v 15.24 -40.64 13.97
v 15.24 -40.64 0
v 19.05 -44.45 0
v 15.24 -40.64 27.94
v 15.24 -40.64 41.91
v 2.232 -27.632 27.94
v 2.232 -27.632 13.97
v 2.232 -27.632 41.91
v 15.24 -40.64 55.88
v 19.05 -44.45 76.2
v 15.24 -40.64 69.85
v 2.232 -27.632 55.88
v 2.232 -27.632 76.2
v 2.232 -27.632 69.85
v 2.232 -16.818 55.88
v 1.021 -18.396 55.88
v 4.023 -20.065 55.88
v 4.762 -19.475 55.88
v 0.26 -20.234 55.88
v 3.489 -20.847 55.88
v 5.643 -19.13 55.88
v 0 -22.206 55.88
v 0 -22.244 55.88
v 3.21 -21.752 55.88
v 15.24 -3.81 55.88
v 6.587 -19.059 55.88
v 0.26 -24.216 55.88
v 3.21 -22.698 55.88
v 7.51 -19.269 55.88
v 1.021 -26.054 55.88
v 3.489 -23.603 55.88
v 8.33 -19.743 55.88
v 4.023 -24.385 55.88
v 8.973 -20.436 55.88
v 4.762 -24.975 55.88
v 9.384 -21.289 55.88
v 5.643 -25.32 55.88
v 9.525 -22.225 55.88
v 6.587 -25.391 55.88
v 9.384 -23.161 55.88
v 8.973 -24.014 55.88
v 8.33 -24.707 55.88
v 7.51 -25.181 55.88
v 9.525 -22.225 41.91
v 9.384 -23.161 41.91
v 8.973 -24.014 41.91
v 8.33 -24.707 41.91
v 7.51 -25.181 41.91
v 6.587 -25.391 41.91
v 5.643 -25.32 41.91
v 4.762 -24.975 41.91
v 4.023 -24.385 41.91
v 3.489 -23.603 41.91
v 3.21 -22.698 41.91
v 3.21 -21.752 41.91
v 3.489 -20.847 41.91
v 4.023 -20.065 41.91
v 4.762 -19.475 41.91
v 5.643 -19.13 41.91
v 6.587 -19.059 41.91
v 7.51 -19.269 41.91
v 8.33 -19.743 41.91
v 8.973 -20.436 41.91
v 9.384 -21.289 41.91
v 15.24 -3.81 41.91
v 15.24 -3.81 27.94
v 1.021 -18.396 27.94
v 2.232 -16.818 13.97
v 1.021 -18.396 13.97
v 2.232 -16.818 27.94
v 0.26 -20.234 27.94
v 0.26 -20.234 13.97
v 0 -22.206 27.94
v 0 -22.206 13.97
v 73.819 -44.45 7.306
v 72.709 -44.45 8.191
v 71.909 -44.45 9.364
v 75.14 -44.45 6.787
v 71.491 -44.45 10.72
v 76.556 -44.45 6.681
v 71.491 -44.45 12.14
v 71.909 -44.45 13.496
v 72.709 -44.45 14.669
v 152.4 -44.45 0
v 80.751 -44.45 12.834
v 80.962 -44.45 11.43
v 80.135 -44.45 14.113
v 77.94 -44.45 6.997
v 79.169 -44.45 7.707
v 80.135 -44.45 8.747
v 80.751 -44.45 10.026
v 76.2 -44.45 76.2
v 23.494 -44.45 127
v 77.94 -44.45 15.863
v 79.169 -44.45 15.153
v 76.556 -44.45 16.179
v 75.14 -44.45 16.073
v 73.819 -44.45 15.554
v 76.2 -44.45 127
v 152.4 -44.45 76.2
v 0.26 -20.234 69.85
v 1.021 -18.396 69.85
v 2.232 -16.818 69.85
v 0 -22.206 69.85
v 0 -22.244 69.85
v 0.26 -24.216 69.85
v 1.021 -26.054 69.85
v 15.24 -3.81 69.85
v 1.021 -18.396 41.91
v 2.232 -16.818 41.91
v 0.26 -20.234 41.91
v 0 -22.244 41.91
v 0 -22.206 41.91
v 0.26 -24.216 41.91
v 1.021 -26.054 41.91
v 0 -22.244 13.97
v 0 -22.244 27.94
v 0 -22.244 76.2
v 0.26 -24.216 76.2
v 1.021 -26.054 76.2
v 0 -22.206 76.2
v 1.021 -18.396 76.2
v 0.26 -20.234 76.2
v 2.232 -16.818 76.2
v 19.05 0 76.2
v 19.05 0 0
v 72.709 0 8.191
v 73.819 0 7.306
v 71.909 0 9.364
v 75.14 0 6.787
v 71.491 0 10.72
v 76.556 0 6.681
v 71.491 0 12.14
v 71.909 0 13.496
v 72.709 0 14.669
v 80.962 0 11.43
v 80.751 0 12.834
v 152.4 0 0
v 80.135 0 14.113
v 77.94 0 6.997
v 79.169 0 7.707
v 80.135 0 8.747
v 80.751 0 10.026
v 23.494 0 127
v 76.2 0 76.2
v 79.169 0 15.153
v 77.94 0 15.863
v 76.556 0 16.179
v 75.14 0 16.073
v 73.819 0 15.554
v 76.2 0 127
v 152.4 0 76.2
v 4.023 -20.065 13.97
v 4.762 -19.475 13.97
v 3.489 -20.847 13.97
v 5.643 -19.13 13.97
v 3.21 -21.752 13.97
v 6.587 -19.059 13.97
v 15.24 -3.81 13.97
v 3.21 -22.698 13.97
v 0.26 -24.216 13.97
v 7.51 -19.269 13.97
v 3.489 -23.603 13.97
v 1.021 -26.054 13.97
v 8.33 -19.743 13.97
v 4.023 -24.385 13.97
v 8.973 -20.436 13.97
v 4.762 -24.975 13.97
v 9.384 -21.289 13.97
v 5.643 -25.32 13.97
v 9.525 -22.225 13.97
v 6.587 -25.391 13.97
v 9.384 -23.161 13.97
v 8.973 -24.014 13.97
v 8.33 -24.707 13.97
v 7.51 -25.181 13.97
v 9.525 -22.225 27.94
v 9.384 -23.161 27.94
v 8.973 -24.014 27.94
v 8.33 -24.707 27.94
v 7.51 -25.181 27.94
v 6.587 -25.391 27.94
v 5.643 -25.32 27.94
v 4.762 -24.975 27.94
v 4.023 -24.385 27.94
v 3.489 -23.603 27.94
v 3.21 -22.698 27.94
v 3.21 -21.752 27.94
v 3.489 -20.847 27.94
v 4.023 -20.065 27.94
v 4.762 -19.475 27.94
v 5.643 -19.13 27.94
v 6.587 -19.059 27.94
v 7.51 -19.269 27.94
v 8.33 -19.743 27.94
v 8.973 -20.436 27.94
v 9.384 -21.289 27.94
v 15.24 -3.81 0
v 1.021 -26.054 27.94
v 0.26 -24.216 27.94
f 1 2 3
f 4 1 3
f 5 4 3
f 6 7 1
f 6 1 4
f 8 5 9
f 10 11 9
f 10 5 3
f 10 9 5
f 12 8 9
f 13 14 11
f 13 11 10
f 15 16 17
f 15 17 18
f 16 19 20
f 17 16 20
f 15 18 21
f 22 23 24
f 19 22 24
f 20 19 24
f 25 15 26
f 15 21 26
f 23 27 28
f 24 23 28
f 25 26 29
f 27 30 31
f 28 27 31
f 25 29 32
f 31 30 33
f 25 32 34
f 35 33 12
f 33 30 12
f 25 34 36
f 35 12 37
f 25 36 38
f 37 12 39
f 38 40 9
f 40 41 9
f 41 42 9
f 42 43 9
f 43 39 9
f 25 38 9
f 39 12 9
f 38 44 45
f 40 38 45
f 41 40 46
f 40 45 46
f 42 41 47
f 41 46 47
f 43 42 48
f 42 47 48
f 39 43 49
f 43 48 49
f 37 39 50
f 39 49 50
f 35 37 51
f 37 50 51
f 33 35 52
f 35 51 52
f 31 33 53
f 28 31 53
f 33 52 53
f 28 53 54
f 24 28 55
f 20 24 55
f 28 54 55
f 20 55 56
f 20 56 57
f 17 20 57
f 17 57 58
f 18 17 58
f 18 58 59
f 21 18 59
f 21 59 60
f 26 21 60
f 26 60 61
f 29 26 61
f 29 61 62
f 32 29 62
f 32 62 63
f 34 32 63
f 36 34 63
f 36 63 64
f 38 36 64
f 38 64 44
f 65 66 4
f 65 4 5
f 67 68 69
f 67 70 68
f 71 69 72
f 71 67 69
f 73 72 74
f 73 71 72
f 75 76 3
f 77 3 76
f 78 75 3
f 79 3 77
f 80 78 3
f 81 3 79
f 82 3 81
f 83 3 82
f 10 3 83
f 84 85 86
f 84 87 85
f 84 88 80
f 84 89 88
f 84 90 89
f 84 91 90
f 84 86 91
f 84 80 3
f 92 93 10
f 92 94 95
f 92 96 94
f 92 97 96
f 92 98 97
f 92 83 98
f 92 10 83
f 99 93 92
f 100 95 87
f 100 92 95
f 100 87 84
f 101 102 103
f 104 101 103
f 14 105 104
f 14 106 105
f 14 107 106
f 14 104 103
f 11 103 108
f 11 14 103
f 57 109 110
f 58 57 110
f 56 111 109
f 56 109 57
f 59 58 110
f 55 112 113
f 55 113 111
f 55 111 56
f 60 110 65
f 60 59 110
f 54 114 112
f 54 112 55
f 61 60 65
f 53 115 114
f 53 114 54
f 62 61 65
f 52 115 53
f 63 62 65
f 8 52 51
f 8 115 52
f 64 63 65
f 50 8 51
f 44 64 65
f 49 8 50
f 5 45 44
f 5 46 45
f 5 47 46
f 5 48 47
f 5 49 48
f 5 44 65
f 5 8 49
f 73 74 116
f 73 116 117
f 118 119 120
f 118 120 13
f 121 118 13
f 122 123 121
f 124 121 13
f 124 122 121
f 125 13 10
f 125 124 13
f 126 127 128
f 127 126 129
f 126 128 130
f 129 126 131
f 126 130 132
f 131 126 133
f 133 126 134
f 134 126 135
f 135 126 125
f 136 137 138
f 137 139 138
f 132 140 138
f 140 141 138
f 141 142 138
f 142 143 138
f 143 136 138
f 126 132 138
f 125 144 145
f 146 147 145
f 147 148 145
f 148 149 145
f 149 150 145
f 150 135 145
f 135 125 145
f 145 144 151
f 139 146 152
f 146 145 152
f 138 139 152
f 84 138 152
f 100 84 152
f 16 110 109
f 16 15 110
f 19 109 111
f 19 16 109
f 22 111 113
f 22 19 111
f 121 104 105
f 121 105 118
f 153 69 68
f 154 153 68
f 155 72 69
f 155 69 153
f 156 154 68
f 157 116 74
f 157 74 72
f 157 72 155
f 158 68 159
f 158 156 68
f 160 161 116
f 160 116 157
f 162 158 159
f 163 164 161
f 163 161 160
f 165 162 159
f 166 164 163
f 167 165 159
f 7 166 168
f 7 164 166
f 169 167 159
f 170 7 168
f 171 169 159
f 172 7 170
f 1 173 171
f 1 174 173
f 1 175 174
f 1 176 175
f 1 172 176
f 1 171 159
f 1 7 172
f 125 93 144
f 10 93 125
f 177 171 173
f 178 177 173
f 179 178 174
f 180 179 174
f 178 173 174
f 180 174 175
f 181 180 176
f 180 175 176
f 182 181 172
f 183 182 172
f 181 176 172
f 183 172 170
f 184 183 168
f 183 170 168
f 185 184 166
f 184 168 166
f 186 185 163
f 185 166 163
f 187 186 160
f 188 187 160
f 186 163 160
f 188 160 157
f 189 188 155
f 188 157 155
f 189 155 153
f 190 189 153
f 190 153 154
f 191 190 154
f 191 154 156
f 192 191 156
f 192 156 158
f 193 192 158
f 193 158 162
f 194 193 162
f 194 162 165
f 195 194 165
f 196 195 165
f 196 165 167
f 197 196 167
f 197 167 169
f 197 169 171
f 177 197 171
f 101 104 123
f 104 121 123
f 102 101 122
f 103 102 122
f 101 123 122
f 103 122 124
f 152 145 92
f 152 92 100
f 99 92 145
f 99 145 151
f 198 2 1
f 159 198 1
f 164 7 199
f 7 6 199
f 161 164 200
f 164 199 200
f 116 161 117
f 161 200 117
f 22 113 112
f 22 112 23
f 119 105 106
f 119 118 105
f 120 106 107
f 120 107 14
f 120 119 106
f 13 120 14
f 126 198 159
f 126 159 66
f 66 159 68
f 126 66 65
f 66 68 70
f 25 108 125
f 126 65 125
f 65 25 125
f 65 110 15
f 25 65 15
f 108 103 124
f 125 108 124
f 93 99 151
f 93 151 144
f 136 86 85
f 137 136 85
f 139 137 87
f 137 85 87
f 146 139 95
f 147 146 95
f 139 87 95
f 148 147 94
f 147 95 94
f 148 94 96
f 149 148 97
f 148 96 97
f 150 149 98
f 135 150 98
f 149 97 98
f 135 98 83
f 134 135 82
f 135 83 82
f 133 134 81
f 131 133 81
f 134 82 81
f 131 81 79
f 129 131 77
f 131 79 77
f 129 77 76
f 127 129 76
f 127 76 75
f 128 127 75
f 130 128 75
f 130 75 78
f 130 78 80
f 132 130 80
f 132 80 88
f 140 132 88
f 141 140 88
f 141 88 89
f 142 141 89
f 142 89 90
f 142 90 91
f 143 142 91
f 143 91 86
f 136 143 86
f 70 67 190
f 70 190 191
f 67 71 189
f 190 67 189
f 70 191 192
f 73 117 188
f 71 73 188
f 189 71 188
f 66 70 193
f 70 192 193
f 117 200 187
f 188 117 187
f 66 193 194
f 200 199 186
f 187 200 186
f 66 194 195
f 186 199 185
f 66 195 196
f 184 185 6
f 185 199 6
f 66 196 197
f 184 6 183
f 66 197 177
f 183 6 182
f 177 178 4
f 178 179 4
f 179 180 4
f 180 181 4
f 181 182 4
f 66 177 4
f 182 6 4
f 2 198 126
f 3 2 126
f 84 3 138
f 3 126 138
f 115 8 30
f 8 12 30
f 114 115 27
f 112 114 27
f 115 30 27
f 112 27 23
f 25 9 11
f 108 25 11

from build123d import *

# Parameters (mm, degrees)
F0_W       = 152.4
F0_H       = 76.2
F1_DEPTH   = 44.45
F2_W       = 15.24
F2_H       = 13.97
F3_DEPTH   = 44.451
F4_R       = 3.175
F5_DEPTH   = 69.85
F6_C1_SIZE = 19.05
F6_C2_SIZE = 19.05
F7_R       = 4.7625
F8_DEPTH   = 44.451
F10_DEPTH  = 44.45
F11_R      = 7.62


with BuildPart() as f1:
    # F0 (on Front) → F1 (new body)
    with BuildSketch(Plane.XZ):
        with Locations((76.2, 38.1)):
            Rectangle(F0_W, F0_H)
    extrude(amount=F1_DEPTH)

    # F2 (on face) → F3 (cut, through all)
    with BuildSketch(Plane.XZ.offset(44.45)):
        with Locations((7.62, 6.985)):
            Rectangle(F2_W, F2_H)
        with Locations((7.62, 34.925)):
            Rectangle(F2_W, F2_H)
        with Locations((7.62, 62.865)):
            Rectangle(F2_W, F2_H)
    extrude(amount=-F3_DEPTH, mode=Mode.SUBTRACT)

    # F4 (on face) → F5 (cut)
    with BuildSketch(Plane(origin=(0, 0, 0), x_dir=(1, 0, 0), z_dir=(0, 0, -1))):
        with Locations((6.35, 22.225)):
            Circle(F4_R)
    extrude(amount=-F5_DEPTH, mode=Mode.SUBTRACT)

    # F6: chamfer of 19.05 on 6 edges, made by hand

    # F6_c1
    f6_c1_edges = [f1.edges().sort_by_distance(p)[0] for p in [
        (0, 0, 73.025),
    ]]
    chamfer(f6_c1_edges, length=F6_C1_SIZE)

    # F6_c2
    f6_c2_edges = [f1.edges().sort_by_distance(p)[0] for p in [
        (0, -44.45, 73.025),
    ]]
    chamfer(f6_c2_edges, length=F6_C2_SIZE)

    # F7 (on face) → F8 (cut, through all)
    with BuildSketch(Plane.XZ.offset(44.45)):
        with Locations((76.2, 11.43)):
            Circle(F7_R)
    extrude(amount=-F8_DEPTH, mode=Mode.SUBTRACT)

    # F9 (on face) → F10 (join)
    with BuildSketch(Plane.XZ.offset(44.45)):
        Polygon((23.4944241071, 127), (19.05, 76.2), (76.2, 76.2), (76.2, 127), align=None)
    extrude(amount=-F10_DEPTH)

    # F11
    f11_edges = [f1.edges().sort_by_distance(p)[0] for p in [
        (0, -19.05, 73.025),
        (0, -25.4, 73.025),
        (0, -25.4, 48.895),
        (0, -19.05, 48.895),
        (0, -19.05, 20.955),
        (0, -25.4, 20.955),
    ]]
    fillet(f11_edges, radius=F11_R)


solid = f1.part
